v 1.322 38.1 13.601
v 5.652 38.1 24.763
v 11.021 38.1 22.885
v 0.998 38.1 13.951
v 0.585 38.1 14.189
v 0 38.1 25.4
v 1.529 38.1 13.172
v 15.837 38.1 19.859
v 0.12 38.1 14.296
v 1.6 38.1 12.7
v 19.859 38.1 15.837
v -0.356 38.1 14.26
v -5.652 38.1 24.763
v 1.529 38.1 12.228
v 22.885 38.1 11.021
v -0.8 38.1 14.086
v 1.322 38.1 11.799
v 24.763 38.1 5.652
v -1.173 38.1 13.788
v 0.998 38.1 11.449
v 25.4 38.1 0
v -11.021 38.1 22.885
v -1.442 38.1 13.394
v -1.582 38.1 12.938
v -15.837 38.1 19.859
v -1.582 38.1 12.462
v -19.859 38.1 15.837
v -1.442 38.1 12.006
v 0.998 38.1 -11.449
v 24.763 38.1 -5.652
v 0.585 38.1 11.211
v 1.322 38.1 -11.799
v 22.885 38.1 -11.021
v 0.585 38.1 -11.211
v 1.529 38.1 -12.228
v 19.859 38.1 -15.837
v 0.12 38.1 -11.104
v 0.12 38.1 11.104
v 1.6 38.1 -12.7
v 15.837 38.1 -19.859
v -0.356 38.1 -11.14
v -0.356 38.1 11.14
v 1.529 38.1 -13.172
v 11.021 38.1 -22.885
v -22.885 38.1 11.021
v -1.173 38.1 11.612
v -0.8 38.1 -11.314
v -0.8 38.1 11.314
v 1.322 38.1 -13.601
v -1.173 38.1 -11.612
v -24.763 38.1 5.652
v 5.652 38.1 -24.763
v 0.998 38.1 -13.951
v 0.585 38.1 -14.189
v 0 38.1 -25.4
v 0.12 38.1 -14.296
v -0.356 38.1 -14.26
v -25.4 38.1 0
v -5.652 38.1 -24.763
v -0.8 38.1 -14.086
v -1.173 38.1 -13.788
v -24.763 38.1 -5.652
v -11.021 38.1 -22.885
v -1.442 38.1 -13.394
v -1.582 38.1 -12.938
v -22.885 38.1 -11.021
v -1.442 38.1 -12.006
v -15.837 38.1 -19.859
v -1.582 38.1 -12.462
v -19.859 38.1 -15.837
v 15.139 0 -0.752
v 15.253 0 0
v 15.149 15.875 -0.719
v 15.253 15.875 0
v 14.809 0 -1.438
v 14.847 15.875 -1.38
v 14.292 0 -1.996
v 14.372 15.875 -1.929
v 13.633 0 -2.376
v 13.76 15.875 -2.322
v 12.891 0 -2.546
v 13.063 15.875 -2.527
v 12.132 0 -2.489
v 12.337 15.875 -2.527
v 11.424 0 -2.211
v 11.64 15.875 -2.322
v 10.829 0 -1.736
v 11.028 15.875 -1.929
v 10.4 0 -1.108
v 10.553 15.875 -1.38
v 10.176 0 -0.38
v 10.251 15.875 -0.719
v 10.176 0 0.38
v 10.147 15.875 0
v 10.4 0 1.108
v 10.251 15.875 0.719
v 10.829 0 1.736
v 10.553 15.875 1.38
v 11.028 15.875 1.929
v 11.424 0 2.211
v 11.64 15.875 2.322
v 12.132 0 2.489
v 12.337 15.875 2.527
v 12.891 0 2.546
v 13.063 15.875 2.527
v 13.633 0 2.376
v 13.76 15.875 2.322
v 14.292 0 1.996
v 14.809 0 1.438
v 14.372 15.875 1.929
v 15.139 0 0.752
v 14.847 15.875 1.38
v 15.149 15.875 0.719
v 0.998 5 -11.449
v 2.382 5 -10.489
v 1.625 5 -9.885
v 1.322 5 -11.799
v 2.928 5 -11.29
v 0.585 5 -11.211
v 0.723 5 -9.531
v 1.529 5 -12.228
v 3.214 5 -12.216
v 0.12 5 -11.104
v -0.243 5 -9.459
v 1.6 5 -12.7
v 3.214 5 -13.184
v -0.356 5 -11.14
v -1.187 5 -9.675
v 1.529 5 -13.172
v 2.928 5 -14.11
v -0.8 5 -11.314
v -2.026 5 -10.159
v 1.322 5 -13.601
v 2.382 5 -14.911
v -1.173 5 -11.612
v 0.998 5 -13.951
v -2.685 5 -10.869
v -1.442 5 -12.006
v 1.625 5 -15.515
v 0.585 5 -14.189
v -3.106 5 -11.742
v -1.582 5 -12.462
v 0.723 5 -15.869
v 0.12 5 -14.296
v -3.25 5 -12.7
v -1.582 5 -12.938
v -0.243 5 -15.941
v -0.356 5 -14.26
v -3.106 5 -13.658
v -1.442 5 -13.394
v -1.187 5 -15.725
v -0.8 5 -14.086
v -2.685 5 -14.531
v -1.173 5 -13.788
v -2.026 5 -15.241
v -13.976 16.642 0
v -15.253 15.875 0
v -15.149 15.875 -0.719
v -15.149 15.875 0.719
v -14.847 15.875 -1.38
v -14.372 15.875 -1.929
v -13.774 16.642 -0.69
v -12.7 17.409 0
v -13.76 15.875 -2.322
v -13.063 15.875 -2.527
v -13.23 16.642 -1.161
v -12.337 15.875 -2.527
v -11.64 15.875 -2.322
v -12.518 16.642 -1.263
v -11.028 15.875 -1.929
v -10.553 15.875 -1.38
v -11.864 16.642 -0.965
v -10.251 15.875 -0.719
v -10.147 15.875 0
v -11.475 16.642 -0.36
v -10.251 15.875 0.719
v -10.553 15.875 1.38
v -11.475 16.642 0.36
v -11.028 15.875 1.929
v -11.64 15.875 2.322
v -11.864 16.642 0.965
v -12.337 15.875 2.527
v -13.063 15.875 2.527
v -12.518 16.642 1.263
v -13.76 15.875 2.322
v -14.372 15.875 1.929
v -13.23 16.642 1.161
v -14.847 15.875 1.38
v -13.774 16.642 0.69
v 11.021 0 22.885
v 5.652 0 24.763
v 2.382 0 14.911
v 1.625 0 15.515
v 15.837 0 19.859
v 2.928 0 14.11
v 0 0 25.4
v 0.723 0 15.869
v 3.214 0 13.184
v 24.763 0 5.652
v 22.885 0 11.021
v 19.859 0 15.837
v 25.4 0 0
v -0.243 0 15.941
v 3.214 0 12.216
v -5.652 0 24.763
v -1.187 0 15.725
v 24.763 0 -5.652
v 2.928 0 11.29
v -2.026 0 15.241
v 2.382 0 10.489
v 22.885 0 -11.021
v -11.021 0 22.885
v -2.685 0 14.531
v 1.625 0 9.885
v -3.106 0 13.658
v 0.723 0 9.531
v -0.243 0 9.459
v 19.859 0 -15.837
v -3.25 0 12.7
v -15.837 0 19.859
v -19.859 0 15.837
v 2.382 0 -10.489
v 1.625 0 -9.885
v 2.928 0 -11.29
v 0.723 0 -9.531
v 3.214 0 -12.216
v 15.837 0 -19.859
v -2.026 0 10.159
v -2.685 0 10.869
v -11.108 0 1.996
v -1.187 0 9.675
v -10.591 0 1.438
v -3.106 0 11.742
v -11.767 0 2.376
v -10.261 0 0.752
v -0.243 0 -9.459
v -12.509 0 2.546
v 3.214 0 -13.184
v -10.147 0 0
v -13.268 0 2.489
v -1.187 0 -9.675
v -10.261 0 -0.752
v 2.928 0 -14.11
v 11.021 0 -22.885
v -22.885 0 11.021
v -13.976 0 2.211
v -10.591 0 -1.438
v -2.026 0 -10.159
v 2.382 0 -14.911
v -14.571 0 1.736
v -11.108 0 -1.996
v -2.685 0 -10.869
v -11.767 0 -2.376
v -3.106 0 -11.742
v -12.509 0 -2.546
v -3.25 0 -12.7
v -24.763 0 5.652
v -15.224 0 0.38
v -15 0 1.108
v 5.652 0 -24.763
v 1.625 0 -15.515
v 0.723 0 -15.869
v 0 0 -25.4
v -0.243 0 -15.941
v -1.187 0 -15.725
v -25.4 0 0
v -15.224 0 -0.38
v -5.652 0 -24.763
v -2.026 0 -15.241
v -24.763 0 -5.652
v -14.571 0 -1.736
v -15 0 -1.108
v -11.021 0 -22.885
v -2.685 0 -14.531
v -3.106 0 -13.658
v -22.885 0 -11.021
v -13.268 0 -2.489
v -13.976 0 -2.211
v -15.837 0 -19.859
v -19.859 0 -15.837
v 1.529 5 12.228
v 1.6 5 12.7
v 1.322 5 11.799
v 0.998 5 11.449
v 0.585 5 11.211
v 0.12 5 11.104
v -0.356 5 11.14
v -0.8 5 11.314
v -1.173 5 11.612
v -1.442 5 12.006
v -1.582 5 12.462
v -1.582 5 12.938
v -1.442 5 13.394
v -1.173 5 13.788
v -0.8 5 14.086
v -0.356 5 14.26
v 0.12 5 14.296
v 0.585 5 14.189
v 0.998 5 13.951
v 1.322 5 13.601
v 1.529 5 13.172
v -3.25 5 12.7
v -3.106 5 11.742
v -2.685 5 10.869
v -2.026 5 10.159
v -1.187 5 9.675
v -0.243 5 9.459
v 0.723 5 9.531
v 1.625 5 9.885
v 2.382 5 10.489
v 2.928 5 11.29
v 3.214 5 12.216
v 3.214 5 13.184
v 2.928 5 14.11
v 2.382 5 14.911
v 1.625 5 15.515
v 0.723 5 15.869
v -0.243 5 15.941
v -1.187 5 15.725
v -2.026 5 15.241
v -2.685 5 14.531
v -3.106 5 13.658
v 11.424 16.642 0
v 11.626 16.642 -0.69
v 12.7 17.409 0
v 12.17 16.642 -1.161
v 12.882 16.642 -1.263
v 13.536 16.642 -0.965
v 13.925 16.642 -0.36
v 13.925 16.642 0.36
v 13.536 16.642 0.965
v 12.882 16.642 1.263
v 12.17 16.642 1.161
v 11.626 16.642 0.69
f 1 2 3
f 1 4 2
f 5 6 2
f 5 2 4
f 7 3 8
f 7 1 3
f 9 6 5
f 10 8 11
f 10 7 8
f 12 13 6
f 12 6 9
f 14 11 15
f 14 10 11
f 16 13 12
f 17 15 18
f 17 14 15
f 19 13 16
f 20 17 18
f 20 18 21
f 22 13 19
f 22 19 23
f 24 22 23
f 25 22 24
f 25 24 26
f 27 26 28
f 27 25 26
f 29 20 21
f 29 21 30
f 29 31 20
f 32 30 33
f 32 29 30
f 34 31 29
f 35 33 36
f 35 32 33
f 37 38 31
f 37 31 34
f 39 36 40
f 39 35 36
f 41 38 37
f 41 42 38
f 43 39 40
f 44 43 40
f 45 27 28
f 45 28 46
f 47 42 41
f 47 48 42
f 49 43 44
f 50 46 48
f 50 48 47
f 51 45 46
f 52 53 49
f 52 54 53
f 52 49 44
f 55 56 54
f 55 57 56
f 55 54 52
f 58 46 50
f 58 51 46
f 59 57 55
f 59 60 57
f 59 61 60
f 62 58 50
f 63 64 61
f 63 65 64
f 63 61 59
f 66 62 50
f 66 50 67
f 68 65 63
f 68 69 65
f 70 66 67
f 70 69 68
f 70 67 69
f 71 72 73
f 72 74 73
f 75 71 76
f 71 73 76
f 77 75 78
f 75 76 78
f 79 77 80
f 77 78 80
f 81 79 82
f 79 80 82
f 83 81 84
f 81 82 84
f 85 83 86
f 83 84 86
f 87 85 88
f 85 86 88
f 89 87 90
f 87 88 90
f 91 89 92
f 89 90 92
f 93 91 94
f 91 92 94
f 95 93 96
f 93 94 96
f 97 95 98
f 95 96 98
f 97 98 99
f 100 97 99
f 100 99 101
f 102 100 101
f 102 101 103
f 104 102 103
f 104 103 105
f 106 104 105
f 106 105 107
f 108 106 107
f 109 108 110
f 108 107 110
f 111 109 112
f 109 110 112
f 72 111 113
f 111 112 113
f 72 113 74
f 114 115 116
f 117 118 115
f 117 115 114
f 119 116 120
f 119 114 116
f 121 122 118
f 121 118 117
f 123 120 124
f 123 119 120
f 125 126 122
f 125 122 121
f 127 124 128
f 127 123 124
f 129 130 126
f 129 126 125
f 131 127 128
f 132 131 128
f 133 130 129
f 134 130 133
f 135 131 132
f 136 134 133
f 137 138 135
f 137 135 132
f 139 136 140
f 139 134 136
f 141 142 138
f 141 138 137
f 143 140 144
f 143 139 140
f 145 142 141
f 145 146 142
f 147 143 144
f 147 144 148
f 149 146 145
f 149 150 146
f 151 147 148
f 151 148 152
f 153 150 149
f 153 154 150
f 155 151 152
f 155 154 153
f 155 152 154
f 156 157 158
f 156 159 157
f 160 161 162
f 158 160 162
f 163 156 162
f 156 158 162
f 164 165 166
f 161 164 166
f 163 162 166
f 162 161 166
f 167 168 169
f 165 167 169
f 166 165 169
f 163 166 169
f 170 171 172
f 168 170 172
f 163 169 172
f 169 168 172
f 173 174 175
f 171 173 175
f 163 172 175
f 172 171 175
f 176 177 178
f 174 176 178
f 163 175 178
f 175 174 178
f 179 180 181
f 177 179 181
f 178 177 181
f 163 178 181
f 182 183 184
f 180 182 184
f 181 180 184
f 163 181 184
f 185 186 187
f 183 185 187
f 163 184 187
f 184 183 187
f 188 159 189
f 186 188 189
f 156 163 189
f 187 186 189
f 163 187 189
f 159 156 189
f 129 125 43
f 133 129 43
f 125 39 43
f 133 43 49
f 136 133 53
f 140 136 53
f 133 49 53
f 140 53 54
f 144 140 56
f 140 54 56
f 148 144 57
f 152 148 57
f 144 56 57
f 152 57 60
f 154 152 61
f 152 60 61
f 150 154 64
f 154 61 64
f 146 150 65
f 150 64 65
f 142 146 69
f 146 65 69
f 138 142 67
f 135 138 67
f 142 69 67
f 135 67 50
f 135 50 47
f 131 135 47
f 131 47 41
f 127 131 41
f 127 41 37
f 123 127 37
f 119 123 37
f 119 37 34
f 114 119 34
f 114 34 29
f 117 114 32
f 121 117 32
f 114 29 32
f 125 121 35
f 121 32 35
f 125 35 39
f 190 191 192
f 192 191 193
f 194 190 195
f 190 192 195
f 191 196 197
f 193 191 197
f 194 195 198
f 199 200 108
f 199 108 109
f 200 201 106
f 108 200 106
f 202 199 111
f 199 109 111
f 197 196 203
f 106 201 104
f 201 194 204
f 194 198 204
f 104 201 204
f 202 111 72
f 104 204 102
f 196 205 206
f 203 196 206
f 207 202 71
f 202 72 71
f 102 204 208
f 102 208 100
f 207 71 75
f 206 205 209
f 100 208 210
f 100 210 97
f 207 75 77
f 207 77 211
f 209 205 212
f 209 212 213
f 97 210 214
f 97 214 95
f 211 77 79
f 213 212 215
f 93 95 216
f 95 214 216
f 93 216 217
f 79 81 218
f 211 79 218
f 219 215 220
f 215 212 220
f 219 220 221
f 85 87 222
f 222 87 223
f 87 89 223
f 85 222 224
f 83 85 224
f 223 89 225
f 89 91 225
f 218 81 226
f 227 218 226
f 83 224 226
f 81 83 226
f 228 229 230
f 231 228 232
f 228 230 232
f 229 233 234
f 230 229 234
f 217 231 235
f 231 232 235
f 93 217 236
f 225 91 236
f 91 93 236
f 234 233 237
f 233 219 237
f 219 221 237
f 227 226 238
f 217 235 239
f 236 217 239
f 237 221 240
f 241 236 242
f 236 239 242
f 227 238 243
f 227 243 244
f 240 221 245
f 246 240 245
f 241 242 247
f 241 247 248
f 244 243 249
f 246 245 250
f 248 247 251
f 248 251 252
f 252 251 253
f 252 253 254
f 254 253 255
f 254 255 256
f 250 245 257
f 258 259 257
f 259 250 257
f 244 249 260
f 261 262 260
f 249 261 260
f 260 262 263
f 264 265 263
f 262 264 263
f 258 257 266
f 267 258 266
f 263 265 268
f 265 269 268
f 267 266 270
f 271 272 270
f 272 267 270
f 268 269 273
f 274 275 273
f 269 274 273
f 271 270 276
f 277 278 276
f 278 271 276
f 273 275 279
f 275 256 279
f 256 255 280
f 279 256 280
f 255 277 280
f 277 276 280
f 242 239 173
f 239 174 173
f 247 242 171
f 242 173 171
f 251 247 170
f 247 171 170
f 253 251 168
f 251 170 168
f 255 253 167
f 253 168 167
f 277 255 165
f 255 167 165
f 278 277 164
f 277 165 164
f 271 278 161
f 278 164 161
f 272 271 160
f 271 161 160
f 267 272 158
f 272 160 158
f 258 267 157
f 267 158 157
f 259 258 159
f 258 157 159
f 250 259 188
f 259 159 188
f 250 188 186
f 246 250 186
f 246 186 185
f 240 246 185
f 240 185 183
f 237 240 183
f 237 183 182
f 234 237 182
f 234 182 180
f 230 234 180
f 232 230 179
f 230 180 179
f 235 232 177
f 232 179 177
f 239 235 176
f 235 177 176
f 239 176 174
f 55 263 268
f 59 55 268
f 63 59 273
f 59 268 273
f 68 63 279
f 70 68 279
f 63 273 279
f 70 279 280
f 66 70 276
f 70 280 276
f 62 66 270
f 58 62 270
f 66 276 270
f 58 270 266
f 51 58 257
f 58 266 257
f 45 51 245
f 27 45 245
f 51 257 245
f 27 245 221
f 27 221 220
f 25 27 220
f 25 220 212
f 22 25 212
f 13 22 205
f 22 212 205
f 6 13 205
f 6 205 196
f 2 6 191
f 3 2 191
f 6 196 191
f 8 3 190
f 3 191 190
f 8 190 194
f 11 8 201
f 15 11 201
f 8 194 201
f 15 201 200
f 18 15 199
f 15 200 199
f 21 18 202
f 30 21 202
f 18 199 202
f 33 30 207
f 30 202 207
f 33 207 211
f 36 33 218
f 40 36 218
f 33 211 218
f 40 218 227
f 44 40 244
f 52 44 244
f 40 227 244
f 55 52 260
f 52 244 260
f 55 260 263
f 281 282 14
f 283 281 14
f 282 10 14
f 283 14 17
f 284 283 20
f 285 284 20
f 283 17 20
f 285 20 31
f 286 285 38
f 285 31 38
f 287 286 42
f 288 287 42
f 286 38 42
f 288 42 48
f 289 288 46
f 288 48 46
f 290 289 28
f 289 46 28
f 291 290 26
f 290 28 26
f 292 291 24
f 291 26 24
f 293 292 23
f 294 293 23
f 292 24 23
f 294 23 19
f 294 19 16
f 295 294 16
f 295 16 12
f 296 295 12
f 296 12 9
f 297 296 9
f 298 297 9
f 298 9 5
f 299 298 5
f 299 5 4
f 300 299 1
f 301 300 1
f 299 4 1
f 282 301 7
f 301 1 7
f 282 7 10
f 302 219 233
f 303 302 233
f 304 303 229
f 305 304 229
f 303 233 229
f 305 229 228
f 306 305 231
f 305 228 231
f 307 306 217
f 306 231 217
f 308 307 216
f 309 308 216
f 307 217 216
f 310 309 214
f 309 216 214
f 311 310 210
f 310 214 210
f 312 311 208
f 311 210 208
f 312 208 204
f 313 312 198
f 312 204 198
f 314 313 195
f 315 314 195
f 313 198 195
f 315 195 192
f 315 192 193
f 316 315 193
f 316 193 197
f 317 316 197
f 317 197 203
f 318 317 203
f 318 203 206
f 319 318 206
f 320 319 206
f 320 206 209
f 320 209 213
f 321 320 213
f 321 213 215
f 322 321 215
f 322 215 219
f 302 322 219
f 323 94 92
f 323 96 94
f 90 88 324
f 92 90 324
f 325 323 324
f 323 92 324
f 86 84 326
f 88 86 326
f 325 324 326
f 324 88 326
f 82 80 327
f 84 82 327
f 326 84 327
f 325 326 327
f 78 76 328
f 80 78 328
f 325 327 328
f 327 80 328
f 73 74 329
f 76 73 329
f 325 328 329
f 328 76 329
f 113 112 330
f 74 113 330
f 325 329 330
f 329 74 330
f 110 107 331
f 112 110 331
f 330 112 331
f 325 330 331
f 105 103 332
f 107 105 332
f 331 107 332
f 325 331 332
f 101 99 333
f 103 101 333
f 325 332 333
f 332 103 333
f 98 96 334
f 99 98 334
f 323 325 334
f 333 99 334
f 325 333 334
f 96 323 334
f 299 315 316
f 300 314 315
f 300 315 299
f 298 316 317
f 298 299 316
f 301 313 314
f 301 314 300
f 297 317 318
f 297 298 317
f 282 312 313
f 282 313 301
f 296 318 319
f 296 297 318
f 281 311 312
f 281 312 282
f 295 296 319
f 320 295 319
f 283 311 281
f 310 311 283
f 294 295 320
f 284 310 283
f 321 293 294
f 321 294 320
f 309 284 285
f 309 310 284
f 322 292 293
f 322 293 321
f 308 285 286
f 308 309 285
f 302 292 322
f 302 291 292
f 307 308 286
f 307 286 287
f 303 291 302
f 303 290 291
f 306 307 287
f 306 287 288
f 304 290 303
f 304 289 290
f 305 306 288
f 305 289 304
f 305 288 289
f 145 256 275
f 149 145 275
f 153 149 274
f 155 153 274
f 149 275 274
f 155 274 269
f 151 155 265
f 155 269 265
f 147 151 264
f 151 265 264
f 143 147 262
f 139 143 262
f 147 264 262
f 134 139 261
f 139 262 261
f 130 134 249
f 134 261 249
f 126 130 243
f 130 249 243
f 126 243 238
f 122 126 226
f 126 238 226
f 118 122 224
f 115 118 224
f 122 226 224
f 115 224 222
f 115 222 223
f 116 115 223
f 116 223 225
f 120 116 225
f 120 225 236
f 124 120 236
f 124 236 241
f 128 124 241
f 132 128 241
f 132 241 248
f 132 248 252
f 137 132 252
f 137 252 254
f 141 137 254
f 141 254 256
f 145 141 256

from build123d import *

# Parameters (mm, degrees)
SKETCH1_R                      = 25.4
BOSS_EXTRUDE1_DEPTH            = 38.1
F_1_4_20_TAPPED_HOLE4_D        = 5.1054
F_1_4_20_TAPPED_HOLE4_DEPTH    = 15.875
F_1_4_20_TAPPED_HOLE4_TIP      = 1.533816902
CBORE_FOR_M3_SHCS1_D           = 3.2
CBORE_FOR_M3_SHCS1_CBORE_D     = 6.5
CBORE_FOR_M3_SHCS1_CBORE_DEPTH = 4.999996


with BuildPart() as part:
    # Sketch1 → Boss-Extrude1 (new body)
    with BuildSketch(Plane(origin=(0, 0, 0), x_dir=(1, 0, 0), z_dir=(0, 1, 0))):
        Circle(SKETCH1_R)
    extrude(amount=BOSS_EXTRUDE1_DEPTH)

    # 1/4-20 Tapped Hole4
    with Locations(Plane(origin=(0, 0, 0), x_dir=(-1, 0, 0), z_dir=(0, -1, 0))):
        with Locations((12.7, 0), (-12.7, 0)):
            Hole(F_1_4_20_TAPPED_HOLE4_D / 2, depth=F_1_4_20_TAPPED_HOLE4_DEPTH)
            with Locations((0, 0, -(F_1_4_20_TAPPED_HOLE4_DEPTH + F_1_4_20_TAPPED_HOLE4_TIP / 2))):  # 118° drill point
                Cone(0, F_1_4_20_TAPPED_HOLE4_D / 2, F_1_4_20_TAPPED_HOLE4_TIP, mode=Mode.SUBTRACT)

    # CBORE for M3 SHCS1 (through all)
    with Locations(Plane(origin=(0, 0, 0), x_dir=(-1, 0, 0), z_dir=(0, -1, 0))):
        with Locations((0, -12.7), (0, 12.7)):
            CounterBoreHole(CBORE_FOR_M3_SHCS1_D / 2, CBORE_FOR_M3_SHCS1_CBORE_D / 2, CBORE_FOR_M3_SHCS1_CBORE_DEPTH)


solid = part.part
